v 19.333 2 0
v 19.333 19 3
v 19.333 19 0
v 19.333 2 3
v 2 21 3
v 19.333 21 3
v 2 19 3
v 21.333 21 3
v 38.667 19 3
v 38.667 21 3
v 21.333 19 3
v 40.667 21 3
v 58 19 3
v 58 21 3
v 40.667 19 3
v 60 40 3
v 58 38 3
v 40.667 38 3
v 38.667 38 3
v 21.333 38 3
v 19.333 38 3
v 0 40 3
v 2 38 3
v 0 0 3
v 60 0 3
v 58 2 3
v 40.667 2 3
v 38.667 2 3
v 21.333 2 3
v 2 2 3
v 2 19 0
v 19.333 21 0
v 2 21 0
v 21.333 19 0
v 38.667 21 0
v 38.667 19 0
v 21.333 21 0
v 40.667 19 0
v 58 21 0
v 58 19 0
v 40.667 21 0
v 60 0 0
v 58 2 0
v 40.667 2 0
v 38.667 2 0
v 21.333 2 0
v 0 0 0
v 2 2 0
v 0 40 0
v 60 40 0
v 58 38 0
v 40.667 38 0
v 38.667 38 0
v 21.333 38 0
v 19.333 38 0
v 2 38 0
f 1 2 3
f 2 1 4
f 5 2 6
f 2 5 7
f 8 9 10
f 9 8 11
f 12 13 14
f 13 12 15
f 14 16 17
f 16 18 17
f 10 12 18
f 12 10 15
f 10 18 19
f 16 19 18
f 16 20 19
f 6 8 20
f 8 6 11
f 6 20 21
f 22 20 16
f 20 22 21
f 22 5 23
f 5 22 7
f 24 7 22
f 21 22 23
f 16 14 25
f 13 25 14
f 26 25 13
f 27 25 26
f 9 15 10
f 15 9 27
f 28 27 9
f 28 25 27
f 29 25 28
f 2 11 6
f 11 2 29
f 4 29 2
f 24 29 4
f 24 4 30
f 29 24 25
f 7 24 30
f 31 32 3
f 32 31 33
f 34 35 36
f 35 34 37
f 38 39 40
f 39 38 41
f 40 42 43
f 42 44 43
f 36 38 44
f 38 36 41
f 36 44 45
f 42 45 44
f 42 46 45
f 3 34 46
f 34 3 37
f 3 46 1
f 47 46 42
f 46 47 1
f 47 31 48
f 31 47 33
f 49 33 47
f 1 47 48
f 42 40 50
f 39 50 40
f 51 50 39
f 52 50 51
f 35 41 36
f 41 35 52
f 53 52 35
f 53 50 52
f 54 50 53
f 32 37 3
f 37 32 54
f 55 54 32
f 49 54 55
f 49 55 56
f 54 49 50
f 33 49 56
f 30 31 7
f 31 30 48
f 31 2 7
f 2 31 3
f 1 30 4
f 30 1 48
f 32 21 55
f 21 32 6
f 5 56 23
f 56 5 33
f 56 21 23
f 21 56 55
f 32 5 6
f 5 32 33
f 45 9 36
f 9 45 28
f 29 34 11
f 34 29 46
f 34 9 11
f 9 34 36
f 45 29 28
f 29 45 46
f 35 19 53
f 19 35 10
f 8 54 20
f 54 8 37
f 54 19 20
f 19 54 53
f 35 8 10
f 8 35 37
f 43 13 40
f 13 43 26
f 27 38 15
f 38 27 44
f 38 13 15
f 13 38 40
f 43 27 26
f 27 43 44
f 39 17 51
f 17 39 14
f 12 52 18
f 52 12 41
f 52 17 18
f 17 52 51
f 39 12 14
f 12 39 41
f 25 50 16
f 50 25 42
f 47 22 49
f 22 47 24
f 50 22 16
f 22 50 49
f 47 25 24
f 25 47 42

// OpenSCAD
// ============================================================
//  Lightweight Mounting Plate  60 × 40 × 3 mm
//  Lightening strategy: nx × ny through-pocket grid
//  Every border and rib wall = 2 mm (≥ 2 mm requirement met)
//  Printed volume < 50 % of solid — verified by echo manifest
// ============================================================
//
//  BOM
//    1 × Mounting plate  60 × 40 × 3 mm   (FDM, PLA / PETG)
//
// ============================================================

// ── Main dimensions ─────────────────────────────────────────
plate_w = 60.0;   // X, mm
plate_h = 40.0;   // Y, mm
plate_t =  3.0;   // Z, mm

// ── Lightening grid parameters ──────────────────────────────
wall = 2.0;   // border + rib thickness (minimum wall), mm
nx   = 3;     // pocket columns
ny   = 2;     // pocket rows

// Pocket size derived so every wall lands exactly on `wall`.
//   Total X: wall + nx*pw + (nx-1)*wall + wall = plate_w
//            → pw = (plate_w - wall*(nx+1)) / nx
pocket_w = (plate_w - wall * (nx + 1)) / nx;   // = 52/3 ≈ 17.333 mm
pocket_h = (plate_h - wall * (ny + 1)) / ny;   // = 34/2 = 17.000 mm

// ── Volume / mass manifest ───────────────────────────────────
solid_vol   = plate_w * plate_h * plate_t;                  // 7 200 mm³
removed_vol = nx * ny * pocket_w * pocket_h * plate_t;      // ≈ 5 304 mm³
remain_vol  = solid_vol - removed_vol;                      // ≈ 1 896 mm³
mass_ratio  = remain_vol / solid_vol;                       // ≈ 0.263

echo(str("=== Mounting Plate Manifest ==="));
echo(str("Outer (W × H × T) mm  : ", plate_w, " × ", plate_h, " × ", plate_t));
echo(str("Pocket grid           : ", nx, " col × ", ny, " row"));
echo(str("Pocket size (W × H) mm: ", pocket_w, " × ", pocket_h));
echo(str("Min wall thickness mm : ", wall));
echo(str("Solid volume    mm³   : ", solid_vol));
echo(str("Removed volume  mm³   : ", removed_vol));
echo(str("Remaining vol   mm³   : ", remain_vol));
echo(str("Mass ratio            : ", mass_ratio, "  [must be < 0.50]"));
echo(str("Mass check PASS       : ", (mass_ratio < 0.50) ? "YES" : "NO"));
echo(str("Wall check PASS       : ", (wall >= 2.0)       ? "YES" : "NO"));

// ── Geometry — one solid body ────────────────────────────────
difference() {

    // Base plate
    cube([plate_w, plate_h, plate_t]);

    // Through-pockets: nx columns × ny rows, uniformly spaced
    for (col = [0 : nx - 1])
        for (row = [0 : ny - 1]) {
            x0 = wall + col * (pocket_w + wall);
            y0 = wall + row * (pocket_h + wall);
            translate([x0, y0, 0])
                cube([pocket_w, pocket_h, plate_t]);
        }
}
